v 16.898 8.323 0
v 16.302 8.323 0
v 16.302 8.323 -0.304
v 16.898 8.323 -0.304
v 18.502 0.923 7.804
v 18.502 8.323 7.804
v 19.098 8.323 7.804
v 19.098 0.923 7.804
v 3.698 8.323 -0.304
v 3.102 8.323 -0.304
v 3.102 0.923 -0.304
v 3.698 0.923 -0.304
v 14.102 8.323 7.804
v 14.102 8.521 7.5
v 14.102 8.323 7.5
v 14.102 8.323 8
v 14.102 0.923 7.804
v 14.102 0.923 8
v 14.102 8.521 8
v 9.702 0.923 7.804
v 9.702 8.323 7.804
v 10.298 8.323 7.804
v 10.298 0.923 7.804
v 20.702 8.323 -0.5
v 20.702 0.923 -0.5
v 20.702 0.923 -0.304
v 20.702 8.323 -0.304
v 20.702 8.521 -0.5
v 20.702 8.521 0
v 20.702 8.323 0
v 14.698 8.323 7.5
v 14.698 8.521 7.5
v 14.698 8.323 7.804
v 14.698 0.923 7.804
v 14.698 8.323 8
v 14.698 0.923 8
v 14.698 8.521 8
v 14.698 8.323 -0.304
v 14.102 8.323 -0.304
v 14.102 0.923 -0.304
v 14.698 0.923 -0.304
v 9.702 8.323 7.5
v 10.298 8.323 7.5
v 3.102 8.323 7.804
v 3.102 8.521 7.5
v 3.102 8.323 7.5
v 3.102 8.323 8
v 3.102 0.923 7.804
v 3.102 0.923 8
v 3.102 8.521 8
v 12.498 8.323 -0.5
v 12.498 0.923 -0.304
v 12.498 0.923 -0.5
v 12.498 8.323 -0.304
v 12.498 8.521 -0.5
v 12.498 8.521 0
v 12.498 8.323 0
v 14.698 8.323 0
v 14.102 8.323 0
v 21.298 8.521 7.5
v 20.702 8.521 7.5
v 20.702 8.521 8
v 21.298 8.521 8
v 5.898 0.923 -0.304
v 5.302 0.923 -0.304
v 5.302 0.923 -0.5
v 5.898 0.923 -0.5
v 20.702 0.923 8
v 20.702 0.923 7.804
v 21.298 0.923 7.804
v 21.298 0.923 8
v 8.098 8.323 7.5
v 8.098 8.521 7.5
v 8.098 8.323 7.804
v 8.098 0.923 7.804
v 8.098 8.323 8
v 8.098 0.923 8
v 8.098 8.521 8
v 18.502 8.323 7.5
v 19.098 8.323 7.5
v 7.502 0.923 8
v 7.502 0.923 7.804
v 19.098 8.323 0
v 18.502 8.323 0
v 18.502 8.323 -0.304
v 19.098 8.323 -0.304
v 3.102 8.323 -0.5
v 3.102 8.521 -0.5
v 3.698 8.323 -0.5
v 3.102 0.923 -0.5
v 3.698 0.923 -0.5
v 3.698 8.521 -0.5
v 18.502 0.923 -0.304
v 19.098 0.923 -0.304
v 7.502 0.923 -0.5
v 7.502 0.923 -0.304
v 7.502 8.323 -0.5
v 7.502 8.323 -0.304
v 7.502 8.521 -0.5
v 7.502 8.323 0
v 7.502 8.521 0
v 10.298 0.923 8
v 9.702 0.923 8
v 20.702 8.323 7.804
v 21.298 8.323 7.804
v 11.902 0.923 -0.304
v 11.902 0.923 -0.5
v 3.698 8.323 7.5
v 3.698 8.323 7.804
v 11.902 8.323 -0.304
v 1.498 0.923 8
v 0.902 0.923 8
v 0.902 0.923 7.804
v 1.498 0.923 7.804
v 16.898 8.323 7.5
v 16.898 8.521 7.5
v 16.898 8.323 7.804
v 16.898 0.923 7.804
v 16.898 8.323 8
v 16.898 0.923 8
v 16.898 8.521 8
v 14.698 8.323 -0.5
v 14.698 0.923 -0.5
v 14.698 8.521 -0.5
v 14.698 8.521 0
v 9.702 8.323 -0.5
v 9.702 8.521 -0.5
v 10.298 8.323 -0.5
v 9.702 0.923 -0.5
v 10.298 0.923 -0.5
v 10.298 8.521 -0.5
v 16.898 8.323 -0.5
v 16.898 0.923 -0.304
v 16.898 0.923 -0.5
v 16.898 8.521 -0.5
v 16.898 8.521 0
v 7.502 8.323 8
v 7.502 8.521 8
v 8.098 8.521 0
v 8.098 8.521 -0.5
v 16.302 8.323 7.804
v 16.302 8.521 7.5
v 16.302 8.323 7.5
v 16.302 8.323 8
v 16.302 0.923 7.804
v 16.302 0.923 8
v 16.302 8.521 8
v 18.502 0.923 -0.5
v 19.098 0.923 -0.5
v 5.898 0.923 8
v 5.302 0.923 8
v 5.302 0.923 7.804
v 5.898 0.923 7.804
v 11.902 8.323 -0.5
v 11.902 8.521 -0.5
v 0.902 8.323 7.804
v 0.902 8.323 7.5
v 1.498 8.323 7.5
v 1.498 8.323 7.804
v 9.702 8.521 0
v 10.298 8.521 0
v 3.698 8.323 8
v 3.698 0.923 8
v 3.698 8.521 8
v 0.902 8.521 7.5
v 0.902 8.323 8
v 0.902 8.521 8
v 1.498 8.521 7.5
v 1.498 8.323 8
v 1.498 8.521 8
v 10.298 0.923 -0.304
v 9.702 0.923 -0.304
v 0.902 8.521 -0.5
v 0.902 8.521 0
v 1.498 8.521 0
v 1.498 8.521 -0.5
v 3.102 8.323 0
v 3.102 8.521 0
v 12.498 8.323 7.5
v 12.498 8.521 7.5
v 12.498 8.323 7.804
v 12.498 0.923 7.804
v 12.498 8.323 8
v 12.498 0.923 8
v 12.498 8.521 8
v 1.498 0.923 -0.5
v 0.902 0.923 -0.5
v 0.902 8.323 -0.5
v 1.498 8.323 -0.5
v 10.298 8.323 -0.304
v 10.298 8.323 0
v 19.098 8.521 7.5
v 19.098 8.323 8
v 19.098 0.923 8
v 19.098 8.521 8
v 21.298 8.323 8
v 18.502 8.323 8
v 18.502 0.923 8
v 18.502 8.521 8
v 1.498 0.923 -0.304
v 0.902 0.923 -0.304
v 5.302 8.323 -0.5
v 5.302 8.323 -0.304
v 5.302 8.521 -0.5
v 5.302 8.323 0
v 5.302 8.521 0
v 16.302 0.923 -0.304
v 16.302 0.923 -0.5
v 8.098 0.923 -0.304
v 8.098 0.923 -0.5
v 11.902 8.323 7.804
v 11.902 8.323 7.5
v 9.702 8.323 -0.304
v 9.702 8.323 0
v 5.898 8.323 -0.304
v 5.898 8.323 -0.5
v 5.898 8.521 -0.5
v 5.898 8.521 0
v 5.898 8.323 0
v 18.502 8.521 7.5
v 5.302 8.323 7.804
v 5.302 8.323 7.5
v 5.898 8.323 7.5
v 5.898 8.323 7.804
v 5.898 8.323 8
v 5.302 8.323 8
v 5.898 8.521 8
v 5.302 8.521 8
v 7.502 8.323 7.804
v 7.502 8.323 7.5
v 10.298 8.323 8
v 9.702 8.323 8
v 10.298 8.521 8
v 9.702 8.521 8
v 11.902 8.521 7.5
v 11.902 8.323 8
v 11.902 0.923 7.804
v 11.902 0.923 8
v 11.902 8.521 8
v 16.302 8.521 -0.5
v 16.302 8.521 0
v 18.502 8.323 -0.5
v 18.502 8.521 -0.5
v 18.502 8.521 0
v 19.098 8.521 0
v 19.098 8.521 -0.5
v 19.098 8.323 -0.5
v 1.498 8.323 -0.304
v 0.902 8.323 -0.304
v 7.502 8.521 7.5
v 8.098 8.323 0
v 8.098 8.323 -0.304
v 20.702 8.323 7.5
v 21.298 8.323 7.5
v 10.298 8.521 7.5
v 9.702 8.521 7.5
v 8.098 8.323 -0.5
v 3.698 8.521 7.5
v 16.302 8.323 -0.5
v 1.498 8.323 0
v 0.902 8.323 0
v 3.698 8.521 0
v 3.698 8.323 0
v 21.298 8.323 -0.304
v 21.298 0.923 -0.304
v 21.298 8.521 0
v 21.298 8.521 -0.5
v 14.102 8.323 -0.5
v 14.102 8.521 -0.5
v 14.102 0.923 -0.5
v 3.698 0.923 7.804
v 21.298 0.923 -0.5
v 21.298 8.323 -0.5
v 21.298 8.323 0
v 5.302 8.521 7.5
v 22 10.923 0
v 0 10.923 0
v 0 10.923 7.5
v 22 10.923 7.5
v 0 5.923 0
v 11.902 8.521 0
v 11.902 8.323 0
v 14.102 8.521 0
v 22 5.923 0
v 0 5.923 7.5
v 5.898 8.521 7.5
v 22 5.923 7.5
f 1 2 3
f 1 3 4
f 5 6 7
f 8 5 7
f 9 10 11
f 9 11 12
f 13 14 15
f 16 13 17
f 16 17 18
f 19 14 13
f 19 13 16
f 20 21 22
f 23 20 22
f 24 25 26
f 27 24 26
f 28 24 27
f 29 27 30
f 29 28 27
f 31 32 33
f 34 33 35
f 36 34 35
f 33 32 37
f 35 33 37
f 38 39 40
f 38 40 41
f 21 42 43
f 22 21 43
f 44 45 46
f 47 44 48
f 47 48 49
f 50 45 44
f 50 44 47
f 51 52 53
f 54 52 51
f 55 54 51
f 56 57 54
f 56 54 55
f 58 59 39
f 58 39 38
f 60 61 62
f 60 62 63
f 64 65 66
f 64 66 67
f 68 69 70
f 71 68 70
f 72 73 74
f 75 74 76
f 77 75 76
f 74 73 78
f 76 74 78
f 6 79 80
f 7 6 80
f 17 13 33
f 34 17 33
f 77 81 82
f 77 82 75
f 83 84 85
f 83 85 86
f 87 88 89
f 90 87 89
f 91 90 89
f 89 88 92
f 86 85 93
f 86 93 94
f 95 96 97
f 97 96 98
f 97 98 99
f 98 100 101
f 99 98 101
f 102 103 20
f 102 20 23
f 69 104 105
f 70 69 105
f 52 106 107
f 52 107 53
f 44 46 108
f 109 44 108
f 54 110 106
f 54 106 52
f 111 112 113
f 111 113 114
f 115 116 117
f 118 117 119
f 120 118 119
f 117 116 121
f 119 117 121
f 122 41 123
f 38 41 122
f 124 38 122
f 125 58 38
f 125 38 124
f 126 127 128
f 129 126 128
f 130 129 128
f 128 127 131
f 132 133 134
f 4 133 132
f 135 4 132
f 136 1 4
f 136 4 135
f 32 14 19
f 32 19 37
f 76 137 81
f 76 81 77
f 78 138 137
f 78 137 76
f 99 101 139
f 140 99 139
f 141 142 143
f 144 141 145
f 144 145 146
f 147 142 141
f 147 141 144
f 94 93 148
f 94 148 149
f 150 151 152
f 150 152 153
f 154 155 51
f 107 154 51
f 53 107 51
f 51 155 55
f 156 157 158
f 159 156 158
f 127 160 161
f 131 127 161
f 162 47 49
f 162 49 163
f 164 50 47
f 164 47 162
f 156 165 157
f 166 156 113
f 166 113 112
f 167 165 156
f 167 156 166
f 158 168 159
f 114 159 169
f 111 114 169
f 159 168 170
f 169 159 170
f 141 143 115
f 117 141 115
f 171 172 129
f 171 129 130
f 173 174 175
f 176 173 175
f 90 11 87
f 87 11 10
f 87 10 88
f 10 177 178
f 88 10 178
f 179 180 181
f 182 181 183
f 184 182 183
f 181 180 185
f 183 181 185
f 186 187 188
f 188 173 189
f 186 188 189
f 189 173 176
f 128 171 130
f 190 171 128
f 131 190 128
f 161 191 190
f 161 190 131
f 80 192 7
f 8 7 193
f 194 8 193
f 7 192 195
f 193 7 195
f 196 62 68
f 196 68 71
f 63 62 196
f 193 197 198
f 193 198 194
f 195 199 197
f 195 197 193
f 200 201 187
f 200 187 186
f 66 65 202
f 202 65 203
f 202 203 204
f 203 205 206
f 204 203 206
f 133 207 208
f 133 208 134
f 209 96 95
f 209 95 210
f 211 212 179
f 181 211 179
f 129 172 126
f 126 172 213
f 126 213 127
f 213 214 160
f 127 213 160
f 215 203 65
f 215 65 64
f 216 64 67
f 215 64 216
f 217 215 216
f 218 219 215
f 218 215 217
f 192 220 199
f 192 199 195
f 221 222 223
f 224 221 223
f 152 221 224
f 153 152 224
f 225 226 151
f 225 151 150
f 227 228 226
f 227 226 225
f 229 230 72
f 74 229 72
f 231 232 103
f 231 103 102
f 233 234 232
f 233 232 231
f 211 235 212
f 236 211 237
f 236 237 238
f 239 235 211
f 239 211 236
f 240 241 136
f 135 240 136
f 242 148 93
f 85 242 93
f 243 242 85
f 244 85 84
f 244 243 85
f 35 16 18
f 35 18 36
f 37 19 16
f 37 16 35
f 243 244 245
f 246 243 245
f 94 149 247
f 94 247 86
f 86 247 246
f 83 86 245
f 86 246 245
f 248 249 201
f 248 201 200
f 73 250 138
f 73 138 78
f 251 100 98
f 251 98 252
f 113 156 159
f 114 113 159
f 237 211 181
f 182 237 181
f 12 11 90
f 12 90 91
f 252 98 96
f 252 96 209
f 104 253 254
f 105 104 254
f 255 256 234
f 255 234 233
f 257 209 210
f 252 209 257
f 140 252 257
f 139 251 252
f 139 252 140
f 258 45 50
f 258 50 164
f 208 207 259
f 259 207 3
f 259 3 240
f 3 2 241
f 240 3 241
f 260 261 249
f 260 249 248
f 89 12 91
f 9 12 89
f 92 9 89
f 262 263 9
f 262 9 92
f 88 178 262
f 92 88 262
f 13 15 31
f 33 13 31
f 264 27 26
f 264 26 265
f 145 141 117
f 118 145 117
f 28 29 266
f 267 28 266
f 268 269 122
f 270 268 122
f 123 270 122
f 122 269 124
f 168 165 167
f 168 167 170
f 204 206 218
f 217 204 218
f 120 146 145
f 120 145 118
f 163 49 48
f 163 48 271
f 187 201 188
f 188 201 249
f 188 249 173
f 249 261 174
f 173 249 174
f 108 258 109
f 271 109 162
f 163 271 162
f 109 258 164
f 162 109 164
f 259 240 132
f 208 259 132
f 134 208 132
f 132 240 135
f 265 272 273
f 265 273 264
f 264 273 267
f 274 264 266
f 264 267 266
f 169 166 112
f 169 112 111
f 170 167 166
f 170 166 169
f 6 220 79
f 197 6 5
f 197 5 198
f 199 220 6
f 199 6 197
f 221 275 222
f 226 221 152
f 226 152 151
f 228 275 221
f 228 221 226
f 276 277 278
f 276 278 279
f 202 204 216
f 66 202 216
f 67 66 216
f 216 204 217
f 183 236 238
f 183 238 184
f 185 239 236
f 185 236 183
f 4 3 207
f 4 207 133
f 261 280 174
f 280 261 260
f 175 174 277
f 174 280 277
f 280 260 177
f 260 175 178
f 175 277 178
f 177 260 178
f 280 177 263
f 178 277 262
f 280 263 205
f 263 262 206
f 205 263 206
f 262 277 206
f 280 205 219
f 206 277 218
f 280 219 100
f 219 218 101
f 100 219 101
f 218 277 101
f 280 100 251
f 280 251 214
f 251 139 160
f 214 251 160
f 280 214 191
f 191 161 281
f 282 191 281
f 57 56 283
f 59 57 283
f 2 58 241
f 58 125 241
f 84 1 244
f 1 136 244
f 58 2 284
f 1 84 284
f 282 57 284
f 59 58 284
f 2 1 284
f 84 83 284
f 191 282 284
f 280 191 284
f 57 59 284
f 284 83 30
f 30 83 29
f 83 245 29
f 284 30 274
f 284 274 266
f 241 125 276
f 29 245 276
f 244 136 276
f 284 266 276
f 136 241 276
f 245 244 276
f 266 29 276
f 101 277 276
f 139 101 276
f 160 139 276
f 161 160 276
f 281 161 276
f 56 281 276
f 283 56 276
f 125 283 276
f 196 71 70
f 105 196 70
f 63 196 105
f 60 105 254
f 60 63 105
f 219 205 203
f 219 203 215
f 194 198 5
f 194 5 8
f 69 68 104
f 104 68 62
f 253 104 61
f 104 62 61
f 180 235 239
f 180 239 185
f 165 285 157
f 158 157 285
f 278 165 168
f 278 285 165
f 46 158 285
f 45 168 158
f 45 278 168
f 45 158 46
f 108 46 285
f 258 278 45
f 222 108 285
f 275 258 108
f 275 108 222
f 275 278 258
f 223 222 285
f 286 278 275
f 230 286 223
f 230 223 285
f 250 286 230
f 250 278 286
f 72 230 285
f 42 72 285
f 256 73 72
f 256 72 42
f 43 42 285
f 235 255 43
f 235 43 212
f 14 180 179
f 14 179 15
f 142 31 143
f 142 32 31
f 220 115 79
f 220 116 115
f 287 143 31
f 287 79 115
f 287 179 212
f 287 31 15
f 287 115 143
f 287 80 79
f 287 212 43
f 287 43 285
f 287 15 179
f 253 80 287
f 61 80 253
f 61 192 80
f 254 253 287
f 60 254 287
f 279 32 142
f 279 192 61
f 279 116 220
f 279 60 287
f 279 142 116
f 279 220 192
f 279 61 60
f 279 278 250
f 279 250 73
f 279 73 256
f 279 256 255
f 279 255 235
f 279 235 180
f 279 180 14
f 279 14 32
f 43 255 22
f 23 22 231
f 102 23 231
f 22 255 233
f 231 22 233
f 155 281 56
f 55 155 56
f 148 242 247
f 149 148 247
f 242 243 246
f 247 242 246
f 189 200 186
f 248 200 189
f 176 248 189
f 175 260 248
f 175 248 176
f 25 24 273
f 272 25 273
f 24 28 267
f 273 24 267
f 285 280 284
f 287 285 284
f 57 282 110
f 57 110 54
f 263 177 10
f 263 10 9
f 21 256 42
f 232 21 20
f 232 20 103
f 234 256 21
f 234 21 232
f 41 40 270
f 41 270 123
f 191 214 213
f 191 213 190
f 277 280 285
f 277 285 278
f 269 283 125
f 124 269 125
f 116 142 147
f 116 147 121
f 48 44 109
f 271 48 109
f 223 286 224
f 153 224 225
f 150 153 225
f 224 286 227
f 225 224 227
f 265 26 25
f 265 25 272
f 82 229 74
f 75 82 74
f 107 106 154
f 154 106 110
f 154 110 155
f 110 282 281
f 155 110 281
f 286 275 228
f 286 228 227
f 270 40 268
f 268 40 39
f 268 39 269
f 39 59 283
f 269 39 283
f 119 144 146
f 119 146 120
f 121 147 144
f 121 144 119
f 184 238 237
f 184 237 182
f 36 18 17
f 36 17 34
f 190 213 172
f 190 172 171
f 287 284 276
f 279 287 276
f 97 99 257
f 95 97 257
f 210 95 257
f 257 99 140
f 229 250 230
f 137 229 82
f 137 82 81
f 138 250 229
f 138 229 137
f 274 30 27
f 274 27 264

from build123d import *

# Parameters (mm, degrees)
SKETCH2_W                = 22
SKETCH2_H                = 5
BOSS_EXTRUDE2_DEPTH      = 7.5
SKETCH16_W               = 0.596885676
SKETCH16_H               = 0.19726192
BOSS_EXTRUDE6_DEPTH      = 0.5
SKETCH17_W               = 0.596885676
SKETCH17_H               = 0.196118077
BOSS_EXTRUDE7_DEPTH      = 7.4
LPATTERN2_COUNT          = 10
LPATTERN2_PITCH          = 2.2
MIRROR1_COPY_1_SKETCH_W  = 0.596885676
MIRROR1_COPY_1_SKETCH_H  = 0.19726192
MIRROR1_COPY_1_DEPTH     = 0.5
MIRROR1_COPY_2_SKETCH_W  = 0.596885676
MIRROR1_COPY_2_SKETCH_H  = 0.19726192
MIRROR1_COPY_2_DEPTH     = 0.5
MIRROR1_COPY_3_SKETCH_W  = 0.596885676
MIRROR1_COPY_3_SKETCH_H  = 0.19726192
MIRROR1_COPY_3_DEPTH     = 0.5
MIRROR1_COPY_4_SKETCH_W  = 0.596885676
MIRROR1_COPY_4_SKETCH_H  = 0.19726192
MIRROR1_COPY_4_DEPTH     = 0.5
MIRROR1_COPY_5_SKETCH_W  = 0.596885676
MIRROR1_COPY_5_SKETCH_H  = 0.19726192
MIRROR1_COPY_5_DEPTH     = 0.5
MIRROR1_COPY_6_SKETCH_W  = 0.596885676
MIRROR1_COPY_6_SKETCH_H  = 0.19726192
MIRROR1_COPY_6_DEPTH     = 0.5
MIRROR1_COPY_7_SKETCH_W  = 0.596885676
MIRROR1_COPY_7_SKETCH_H  = 0.19726192
MIRROR1_COPY_7_DEPTH     = 0.5
MIRROR1_COPY_8_SKETCH_W  = 0.596885676
MIRROR1_COPY_8_SKETCH_H  = 0.19726192
MIRROR1_COPY_8_DEPTH     = 0.5
MIRROR1_COPY_9_SKETCH_W  = 0.596885676
MIRROR1_COPY_9_SKETCH_H  = 0.19726192
MIRROR1_COPY_9_DEPTH     = 0.5
MIRROR1_COPY_10_SKETCH_W = 0.596885676
MIRROR1_COPY_10_SKETCH_H = 0.196118077
MIRROR1_COPY_10_DEPTH    = 7.4
MIRROR1_COPY_11_SKETCH_W = 0.596885676
MIRROR1_COPY_11_SKETCH_H = 0.196118077
MIRROR1_COPY_11_DEPTH    = 7.4
MIRROR1_COPY_12_SKETCH_W = 0.596885676
MIRROR1_COPY_12_SKETCH_H = 0.196118077
MIRROR1_COPY_12_DEPTH    = 7.4
MIRROR1_COPY_13_SKETCH_W = 0.596885676
MIRROR1_COPY_13_SKETCH_H = 0.196118077
MIRROR1_COPY_13_DEPTH    = 7.4
MIRROR1_COPY_14_SKETCH_W = 0.596885676
MIRROR1_COPY_14_SKETCH_H = 0.196118077
MIRROR1_COPY_14_DEPTH    = 7.4
MIRROR1_COPY_15_SKETCH_W = 0.596885676
MIRROR1_COPY_15_SKETCH_H = 0.196118077
MIRROR1_COPY_15_DEPTH    = 7.4
MIRROR1_COPY_16_SKETCH_W = 0.596885676
MIRROR1_COPY_16_SKETCH_H = 0.196118077
MIRROR1_COPY_16_DEPTH    = 7.4
MIRROR1_COPY_17_SKETCH_W = 0.596885676
MIRROR1_COPY_17_SKETCH_H = 0.196118077
MIRROR1_COPY_17_DEPTH    = 7.4
MIRROR1_COPY_18_SKETCH_W = 0.596885676
MIRROR1_COPY_18_SKETCH_H = 0.196118077
MIRROR1_COPY_18_DEPTH    = 7.4


with BuildPart() as part:
    # Sketch2 → Boss-Extrude2 (new body)
    with BuildSketch(Plane(origin=(0, 5.922936542, 0), x_dir=(1, 0, 0), z_dir=(0, 0, 1))):
        with Locations((11, 2.5)):
            Rectangle(SKETCH2_W, SKETCH2_H)
    extrude(amount=BOSS_EXTRUDE2_DEPTH)

    # Sketch16 → Boss-Extrude6 (add)
    with BuildSketch(Plane.XY):
        with Locations((21, 8.422)):
            Rectangle(SKETCH16_W, SKETCH16_H)
    boss_extrude6 = extrude(amount=-BOSS_EXTRUDE6_DEPTH)

    # Sketch17 → Boss-Extrude7 (add)
    with BuildSketch(Plane.XZ.offset(-8.32336904)):
        with Locations((21, -0.401940962)):
            Rectangle(SKETCH17_W, SKETCH17_H)
    boss_extrude7 = extrude(amount=BOSS_EXTRUDE7_DEPTH)

    # LPattern2: Boss-Extrude6, Boss-Extrude7 ×10
    with Locations(*[(-i * LPATTERN2_PITCH, 0, 0) for i in range(1, LPATTERN2_COUNT)]):
        add(boss_extrude6)
        add(boss_extrude7)

    # Mirror1: Boss-Extrude6, Boss-Extrude7 across plane
    add(boss_extrude6.mirror(Plane(origin=(0, 0, 3.75), x_dir=(1, 0, 0), z_dir=(0, 0, -1))))
    add(boss_extrude7.mirror(Plane(origin=(0, 0, 3.75), x_dir=(1, 0, 0), z_dir=(0, 0, -1))))

    # Mirror1 copy 1 sketch → Mirror1 copy 1 (add)
    with BuildSketch(Plane(origin=(-2.2, 0, 7.5), x_dir=(1, 0, 0), z_dir=(0, 0, -1))):
        with Locations((21, -8.422)):
            Rectangle(MIRROR1_COPY_1_SKETCH_W, MIRROR1_COPY_1_SKETCH_H)
    extrude(amount=-MIRROR1_COPY_1_DEPTH)

    # Mirror1 copy 2 sketch → Mirror1 copy 2 (add)
    with BuildSketch(Plane(origin=(-4.4, 0, 7.5), x_dir=(1, 0, 0), z_dir=(0, 0, -1))):
        with Locations((21, -8.422)):
            Rectangle(MIRROR1_COPY_2_SKETCH_W, MIRROR1_COPY_2_SKETCH_H)
    extrude(amount=-MIRROR1_COPY_2_DEPTH)

    # Mirror1 copy 3 sketch → Mirror1 copy 3 (add)
    with BuildSketch(Plane(origin=(-6.6, 0, 7.5), x_dir=(1, 0, 0), z_dir=(0, 0, -1))):
        with Locations((21, -8.422)):
            Rectangle(MIRROR1_COPY_3_SKETCH_W, MIRROR1_COPY_3_SKETCH_H)
    extrude(amount=-MIRROR1_COPY_3_DEPTH)

    # Mirror1 copy 4 sketch → Mirror1 copy 4 (add)
    with BuildSketch(Plane(origin=(-8.8, 0, 7.5), x_dir=(1, 0, 0), z_dir=(0, 0, -1))):
        with Locations((21, -8.422)):
            Rectangle(MIRROR1_COPY_4_SKETCH_W, MIRROR1_COPY_4_SKETCH_H)
    extrude(amount=-MIRROR1_COPY_4_DEPTH)

    # Mirror1 copy 5 sketch → Mirror1 copy 5 (add)
    with BuildSketch(Plane(origin=(-11, 0, 7.5), x_dir=(1, 0, 0), z_dir=(0, 0, -1))):
        with Locations((21, -8.422)):
            Rectangle(MIRROR1_COPY_5_SKETCH_W, MIRROR1_COPY_5_SKETCH_H)
    extrude(amount=-MIRROR1_COPY_5_DEPTH)

    # Mirror1 copy 6 sketch → Mirror1 copy 6 (add)
    with BuildSketch(Plane(origin=(-13.2, 0, 7.5), x_dir=(1, 0, 0), z_dir=(0, 0, -1))):
        with Locations((21, -8.422)):
            Rectangle(MIRROR1_COPY_6_SKETCH_W, MIRROR1_COPY_6_SKETCH_H)
    extrude(amount=-MIRROR1_COPY_6_DEPTH)

    # Mirror1 copy 7 sketch → Mirror1 copy 7 (add)
    with BuildSketch(Plane(origin=(-15.4, 0, 7.5), x_dir=(1, 0, 0), z_dir=(0, 0, -1))):
        with Locations((21, -8.422)):
            Rectangle(MIRROR1_COPY_7_SKETCH_W, MIRROR1_COPY_7_SKETCH_H)
    extrude(amount=-MIRROR1_COPY_7_DEPTH)

    # Mirror1 copy 8 sketch → Mirror1 copy 8 (add)
    with BuildSketch(Plane(origin=(-17.6, 0, 7.5), x_dir=(1, 0, 0), z_dir=(0, 0, -1))):
        with Locations((21, -8.422)):
            Rectangle(MIRROR1_COPY_8_SKETCH_W, MIRROR1_COPY_8_SKETCH_H)
    extrude(amount=-MIRROR1_COPY_8_DEPTH)

    # Mirror1 copy 9 sketch → Mirror1 copy 9 (add)
    with BuildSketch(Plane(origin=(-19.8, 0, 7.5), x_dir=(1, 0, 0), z_dir=(0, 0, -1))):
        with Locations((21, -8.422)):
            Rectangle(MIRROR1_COPY_9_SKETCH_W, MIRROR1_COPY_9_SKETCH_H)
    extrude(amount=-MIRROR1_COPY_9_DEPTH)

    # Mirror1 copy 10 sketch → Mirror1 copy 10 (add)
    with BuildSketch(Plane(origin=(-2.2, 8.32336904, 7.5), x_dir=(1, 0, 0), z_dir=(0, -1, 0))):
        with Locations((21, 0.401940962)):
            Rectangle(MIRROR1_COPY_10_SKETCH_W, MIRROR1_COPY_10_SKETCH_H)
    extrude(amount=MIRROR1_COPY_10_DEPTH)

    # Mirror1 copy 11 sketch → Mirror1 copy 11 (add)
    with BuildSketch(Plane(origin=(-4.4, 8.32336904, 7.5), x_dir=(1, 0, 0), z_dir=(0, -1, 0))):
        with Locations((21, 0.401940962)):
            Rectangle(MIRROR1_COPY_11_SKETCH_W, MIRROR1_COPY_11_SKETCH_H)
    extrude(amount=MIRROR1_COPY_11_DEPTH)

    # Mirror1 copy 12 sketch → Mirror1 copy 12 (add)
    with BuildSketch(Plane(origin=(-6.6, 8.32336904, 7.5), x_dir=(1, 0, 0), z_dir=(0, -1, 0))):
        with Locations((21, 0.401940962)):
            Rectangle(MIRROR1_COPY_12_SKETCH_W, MIRROR1_COPY_12_SKETCH_H)
    extrude(amount=MIRROR1_COPY_12_DEPTH)

    # Mirror1 copy 13 sketch → Mirror1 copy 13 (add)
    with BuildSketch(Plane(origin=(-8.8, 8.32336904, 7.5), x_dir=(1, 0, 0), z_dir=(0, -1, 0))):
        with Locations((21, 0.401940962)):
            Rectangle(MIRROR1_COPY_13_SKETCH_W, MIRROR1_COPY_13_SKETCH_H)
    extrude(amount=MIRROR1_COPY_13_DEPTH)

    # Mirror1 copy 14 sketch → Mirror1 copy 14 (add)
    with BuildSketch(Plane(origin=(-11, 8.32336904, 7.5), x_dir=(1, 0, 0), z_dir=(0, -1, 0))):
        with Locations((21, 0.401940962)):
            Rectangle(MIRROR1_COPY_14_SKETCH_W, MIRROR1_COPY_14_SKETCH_H)
    extrude(amount=MIRROR1_COPY_14_DEPTH)

    # Mirror1 copy 15 sketch → Mirror1 copy 15 (add)
    with BuildSketch(Plane(origin=(-13.2, 8.32336904, 7.5), x_dir=(1, 0, 0), z_dir=(0, -1, 0))):
        with Locations((21, 0.401940962)):
            Rectangle(MIRROR1_COPY_15_SKETCH_W, MIRROR1_COPY_15_SKETCH_H)
    extrude(amount=MIRROR1_COPY_15_DEPTH)

    # Mirror1 copy 16 sketch → Mirror1 copy 16 (add)
    with BuildSketch(Plane(origin=(-15.4, 8.32336904, 7.5), x_dir=(1, 0, 0), z_dir=(0, -1, 0))):
        with Locations((21, 0.401940962)):
            Rectangle(MIRROR1_COPY_16_SKETCH_W, MIRROR1_COPY_16_SKETCH_H)
    extrude(amount=MIRROR1_COPY_16_DEPTH)

    # Mirror1 copy 17 sketch → Mirror1 copy 17 (add)
    with BuildSketch(Plane(origin=(-17.6, 8.32336904, 7.5), x_dir=(1, 0, 0), z_dir=(0, -1, 0))):
        with Locations((21, 0.401940962)):
            Rectangle(MIRROR1_COPY_17_SKETCH_W, MIRROR1_COPY_17_SKETCH_H)
    extrude(amount=MIRROR1_COPY_17_DEPTH)

    # Mirror1 copy 18 sketch → Mirror1 copy 18 (add)
    with BuildSketch(Plane(origin=(-19.8, 8.32336904, 7.5), x_dir=(1, 0, 0), z_dir=(0, -1, 0))):
        with Locations((21, 0.401940962)):
            Rectangle(MIRROR1_COPY_18_SKETCH_W, MIRROR1_COPY_18_SKETCH_H)
    extrude(amount=MIRROR1_COPY_18_DEPTH)


solid = part.part
